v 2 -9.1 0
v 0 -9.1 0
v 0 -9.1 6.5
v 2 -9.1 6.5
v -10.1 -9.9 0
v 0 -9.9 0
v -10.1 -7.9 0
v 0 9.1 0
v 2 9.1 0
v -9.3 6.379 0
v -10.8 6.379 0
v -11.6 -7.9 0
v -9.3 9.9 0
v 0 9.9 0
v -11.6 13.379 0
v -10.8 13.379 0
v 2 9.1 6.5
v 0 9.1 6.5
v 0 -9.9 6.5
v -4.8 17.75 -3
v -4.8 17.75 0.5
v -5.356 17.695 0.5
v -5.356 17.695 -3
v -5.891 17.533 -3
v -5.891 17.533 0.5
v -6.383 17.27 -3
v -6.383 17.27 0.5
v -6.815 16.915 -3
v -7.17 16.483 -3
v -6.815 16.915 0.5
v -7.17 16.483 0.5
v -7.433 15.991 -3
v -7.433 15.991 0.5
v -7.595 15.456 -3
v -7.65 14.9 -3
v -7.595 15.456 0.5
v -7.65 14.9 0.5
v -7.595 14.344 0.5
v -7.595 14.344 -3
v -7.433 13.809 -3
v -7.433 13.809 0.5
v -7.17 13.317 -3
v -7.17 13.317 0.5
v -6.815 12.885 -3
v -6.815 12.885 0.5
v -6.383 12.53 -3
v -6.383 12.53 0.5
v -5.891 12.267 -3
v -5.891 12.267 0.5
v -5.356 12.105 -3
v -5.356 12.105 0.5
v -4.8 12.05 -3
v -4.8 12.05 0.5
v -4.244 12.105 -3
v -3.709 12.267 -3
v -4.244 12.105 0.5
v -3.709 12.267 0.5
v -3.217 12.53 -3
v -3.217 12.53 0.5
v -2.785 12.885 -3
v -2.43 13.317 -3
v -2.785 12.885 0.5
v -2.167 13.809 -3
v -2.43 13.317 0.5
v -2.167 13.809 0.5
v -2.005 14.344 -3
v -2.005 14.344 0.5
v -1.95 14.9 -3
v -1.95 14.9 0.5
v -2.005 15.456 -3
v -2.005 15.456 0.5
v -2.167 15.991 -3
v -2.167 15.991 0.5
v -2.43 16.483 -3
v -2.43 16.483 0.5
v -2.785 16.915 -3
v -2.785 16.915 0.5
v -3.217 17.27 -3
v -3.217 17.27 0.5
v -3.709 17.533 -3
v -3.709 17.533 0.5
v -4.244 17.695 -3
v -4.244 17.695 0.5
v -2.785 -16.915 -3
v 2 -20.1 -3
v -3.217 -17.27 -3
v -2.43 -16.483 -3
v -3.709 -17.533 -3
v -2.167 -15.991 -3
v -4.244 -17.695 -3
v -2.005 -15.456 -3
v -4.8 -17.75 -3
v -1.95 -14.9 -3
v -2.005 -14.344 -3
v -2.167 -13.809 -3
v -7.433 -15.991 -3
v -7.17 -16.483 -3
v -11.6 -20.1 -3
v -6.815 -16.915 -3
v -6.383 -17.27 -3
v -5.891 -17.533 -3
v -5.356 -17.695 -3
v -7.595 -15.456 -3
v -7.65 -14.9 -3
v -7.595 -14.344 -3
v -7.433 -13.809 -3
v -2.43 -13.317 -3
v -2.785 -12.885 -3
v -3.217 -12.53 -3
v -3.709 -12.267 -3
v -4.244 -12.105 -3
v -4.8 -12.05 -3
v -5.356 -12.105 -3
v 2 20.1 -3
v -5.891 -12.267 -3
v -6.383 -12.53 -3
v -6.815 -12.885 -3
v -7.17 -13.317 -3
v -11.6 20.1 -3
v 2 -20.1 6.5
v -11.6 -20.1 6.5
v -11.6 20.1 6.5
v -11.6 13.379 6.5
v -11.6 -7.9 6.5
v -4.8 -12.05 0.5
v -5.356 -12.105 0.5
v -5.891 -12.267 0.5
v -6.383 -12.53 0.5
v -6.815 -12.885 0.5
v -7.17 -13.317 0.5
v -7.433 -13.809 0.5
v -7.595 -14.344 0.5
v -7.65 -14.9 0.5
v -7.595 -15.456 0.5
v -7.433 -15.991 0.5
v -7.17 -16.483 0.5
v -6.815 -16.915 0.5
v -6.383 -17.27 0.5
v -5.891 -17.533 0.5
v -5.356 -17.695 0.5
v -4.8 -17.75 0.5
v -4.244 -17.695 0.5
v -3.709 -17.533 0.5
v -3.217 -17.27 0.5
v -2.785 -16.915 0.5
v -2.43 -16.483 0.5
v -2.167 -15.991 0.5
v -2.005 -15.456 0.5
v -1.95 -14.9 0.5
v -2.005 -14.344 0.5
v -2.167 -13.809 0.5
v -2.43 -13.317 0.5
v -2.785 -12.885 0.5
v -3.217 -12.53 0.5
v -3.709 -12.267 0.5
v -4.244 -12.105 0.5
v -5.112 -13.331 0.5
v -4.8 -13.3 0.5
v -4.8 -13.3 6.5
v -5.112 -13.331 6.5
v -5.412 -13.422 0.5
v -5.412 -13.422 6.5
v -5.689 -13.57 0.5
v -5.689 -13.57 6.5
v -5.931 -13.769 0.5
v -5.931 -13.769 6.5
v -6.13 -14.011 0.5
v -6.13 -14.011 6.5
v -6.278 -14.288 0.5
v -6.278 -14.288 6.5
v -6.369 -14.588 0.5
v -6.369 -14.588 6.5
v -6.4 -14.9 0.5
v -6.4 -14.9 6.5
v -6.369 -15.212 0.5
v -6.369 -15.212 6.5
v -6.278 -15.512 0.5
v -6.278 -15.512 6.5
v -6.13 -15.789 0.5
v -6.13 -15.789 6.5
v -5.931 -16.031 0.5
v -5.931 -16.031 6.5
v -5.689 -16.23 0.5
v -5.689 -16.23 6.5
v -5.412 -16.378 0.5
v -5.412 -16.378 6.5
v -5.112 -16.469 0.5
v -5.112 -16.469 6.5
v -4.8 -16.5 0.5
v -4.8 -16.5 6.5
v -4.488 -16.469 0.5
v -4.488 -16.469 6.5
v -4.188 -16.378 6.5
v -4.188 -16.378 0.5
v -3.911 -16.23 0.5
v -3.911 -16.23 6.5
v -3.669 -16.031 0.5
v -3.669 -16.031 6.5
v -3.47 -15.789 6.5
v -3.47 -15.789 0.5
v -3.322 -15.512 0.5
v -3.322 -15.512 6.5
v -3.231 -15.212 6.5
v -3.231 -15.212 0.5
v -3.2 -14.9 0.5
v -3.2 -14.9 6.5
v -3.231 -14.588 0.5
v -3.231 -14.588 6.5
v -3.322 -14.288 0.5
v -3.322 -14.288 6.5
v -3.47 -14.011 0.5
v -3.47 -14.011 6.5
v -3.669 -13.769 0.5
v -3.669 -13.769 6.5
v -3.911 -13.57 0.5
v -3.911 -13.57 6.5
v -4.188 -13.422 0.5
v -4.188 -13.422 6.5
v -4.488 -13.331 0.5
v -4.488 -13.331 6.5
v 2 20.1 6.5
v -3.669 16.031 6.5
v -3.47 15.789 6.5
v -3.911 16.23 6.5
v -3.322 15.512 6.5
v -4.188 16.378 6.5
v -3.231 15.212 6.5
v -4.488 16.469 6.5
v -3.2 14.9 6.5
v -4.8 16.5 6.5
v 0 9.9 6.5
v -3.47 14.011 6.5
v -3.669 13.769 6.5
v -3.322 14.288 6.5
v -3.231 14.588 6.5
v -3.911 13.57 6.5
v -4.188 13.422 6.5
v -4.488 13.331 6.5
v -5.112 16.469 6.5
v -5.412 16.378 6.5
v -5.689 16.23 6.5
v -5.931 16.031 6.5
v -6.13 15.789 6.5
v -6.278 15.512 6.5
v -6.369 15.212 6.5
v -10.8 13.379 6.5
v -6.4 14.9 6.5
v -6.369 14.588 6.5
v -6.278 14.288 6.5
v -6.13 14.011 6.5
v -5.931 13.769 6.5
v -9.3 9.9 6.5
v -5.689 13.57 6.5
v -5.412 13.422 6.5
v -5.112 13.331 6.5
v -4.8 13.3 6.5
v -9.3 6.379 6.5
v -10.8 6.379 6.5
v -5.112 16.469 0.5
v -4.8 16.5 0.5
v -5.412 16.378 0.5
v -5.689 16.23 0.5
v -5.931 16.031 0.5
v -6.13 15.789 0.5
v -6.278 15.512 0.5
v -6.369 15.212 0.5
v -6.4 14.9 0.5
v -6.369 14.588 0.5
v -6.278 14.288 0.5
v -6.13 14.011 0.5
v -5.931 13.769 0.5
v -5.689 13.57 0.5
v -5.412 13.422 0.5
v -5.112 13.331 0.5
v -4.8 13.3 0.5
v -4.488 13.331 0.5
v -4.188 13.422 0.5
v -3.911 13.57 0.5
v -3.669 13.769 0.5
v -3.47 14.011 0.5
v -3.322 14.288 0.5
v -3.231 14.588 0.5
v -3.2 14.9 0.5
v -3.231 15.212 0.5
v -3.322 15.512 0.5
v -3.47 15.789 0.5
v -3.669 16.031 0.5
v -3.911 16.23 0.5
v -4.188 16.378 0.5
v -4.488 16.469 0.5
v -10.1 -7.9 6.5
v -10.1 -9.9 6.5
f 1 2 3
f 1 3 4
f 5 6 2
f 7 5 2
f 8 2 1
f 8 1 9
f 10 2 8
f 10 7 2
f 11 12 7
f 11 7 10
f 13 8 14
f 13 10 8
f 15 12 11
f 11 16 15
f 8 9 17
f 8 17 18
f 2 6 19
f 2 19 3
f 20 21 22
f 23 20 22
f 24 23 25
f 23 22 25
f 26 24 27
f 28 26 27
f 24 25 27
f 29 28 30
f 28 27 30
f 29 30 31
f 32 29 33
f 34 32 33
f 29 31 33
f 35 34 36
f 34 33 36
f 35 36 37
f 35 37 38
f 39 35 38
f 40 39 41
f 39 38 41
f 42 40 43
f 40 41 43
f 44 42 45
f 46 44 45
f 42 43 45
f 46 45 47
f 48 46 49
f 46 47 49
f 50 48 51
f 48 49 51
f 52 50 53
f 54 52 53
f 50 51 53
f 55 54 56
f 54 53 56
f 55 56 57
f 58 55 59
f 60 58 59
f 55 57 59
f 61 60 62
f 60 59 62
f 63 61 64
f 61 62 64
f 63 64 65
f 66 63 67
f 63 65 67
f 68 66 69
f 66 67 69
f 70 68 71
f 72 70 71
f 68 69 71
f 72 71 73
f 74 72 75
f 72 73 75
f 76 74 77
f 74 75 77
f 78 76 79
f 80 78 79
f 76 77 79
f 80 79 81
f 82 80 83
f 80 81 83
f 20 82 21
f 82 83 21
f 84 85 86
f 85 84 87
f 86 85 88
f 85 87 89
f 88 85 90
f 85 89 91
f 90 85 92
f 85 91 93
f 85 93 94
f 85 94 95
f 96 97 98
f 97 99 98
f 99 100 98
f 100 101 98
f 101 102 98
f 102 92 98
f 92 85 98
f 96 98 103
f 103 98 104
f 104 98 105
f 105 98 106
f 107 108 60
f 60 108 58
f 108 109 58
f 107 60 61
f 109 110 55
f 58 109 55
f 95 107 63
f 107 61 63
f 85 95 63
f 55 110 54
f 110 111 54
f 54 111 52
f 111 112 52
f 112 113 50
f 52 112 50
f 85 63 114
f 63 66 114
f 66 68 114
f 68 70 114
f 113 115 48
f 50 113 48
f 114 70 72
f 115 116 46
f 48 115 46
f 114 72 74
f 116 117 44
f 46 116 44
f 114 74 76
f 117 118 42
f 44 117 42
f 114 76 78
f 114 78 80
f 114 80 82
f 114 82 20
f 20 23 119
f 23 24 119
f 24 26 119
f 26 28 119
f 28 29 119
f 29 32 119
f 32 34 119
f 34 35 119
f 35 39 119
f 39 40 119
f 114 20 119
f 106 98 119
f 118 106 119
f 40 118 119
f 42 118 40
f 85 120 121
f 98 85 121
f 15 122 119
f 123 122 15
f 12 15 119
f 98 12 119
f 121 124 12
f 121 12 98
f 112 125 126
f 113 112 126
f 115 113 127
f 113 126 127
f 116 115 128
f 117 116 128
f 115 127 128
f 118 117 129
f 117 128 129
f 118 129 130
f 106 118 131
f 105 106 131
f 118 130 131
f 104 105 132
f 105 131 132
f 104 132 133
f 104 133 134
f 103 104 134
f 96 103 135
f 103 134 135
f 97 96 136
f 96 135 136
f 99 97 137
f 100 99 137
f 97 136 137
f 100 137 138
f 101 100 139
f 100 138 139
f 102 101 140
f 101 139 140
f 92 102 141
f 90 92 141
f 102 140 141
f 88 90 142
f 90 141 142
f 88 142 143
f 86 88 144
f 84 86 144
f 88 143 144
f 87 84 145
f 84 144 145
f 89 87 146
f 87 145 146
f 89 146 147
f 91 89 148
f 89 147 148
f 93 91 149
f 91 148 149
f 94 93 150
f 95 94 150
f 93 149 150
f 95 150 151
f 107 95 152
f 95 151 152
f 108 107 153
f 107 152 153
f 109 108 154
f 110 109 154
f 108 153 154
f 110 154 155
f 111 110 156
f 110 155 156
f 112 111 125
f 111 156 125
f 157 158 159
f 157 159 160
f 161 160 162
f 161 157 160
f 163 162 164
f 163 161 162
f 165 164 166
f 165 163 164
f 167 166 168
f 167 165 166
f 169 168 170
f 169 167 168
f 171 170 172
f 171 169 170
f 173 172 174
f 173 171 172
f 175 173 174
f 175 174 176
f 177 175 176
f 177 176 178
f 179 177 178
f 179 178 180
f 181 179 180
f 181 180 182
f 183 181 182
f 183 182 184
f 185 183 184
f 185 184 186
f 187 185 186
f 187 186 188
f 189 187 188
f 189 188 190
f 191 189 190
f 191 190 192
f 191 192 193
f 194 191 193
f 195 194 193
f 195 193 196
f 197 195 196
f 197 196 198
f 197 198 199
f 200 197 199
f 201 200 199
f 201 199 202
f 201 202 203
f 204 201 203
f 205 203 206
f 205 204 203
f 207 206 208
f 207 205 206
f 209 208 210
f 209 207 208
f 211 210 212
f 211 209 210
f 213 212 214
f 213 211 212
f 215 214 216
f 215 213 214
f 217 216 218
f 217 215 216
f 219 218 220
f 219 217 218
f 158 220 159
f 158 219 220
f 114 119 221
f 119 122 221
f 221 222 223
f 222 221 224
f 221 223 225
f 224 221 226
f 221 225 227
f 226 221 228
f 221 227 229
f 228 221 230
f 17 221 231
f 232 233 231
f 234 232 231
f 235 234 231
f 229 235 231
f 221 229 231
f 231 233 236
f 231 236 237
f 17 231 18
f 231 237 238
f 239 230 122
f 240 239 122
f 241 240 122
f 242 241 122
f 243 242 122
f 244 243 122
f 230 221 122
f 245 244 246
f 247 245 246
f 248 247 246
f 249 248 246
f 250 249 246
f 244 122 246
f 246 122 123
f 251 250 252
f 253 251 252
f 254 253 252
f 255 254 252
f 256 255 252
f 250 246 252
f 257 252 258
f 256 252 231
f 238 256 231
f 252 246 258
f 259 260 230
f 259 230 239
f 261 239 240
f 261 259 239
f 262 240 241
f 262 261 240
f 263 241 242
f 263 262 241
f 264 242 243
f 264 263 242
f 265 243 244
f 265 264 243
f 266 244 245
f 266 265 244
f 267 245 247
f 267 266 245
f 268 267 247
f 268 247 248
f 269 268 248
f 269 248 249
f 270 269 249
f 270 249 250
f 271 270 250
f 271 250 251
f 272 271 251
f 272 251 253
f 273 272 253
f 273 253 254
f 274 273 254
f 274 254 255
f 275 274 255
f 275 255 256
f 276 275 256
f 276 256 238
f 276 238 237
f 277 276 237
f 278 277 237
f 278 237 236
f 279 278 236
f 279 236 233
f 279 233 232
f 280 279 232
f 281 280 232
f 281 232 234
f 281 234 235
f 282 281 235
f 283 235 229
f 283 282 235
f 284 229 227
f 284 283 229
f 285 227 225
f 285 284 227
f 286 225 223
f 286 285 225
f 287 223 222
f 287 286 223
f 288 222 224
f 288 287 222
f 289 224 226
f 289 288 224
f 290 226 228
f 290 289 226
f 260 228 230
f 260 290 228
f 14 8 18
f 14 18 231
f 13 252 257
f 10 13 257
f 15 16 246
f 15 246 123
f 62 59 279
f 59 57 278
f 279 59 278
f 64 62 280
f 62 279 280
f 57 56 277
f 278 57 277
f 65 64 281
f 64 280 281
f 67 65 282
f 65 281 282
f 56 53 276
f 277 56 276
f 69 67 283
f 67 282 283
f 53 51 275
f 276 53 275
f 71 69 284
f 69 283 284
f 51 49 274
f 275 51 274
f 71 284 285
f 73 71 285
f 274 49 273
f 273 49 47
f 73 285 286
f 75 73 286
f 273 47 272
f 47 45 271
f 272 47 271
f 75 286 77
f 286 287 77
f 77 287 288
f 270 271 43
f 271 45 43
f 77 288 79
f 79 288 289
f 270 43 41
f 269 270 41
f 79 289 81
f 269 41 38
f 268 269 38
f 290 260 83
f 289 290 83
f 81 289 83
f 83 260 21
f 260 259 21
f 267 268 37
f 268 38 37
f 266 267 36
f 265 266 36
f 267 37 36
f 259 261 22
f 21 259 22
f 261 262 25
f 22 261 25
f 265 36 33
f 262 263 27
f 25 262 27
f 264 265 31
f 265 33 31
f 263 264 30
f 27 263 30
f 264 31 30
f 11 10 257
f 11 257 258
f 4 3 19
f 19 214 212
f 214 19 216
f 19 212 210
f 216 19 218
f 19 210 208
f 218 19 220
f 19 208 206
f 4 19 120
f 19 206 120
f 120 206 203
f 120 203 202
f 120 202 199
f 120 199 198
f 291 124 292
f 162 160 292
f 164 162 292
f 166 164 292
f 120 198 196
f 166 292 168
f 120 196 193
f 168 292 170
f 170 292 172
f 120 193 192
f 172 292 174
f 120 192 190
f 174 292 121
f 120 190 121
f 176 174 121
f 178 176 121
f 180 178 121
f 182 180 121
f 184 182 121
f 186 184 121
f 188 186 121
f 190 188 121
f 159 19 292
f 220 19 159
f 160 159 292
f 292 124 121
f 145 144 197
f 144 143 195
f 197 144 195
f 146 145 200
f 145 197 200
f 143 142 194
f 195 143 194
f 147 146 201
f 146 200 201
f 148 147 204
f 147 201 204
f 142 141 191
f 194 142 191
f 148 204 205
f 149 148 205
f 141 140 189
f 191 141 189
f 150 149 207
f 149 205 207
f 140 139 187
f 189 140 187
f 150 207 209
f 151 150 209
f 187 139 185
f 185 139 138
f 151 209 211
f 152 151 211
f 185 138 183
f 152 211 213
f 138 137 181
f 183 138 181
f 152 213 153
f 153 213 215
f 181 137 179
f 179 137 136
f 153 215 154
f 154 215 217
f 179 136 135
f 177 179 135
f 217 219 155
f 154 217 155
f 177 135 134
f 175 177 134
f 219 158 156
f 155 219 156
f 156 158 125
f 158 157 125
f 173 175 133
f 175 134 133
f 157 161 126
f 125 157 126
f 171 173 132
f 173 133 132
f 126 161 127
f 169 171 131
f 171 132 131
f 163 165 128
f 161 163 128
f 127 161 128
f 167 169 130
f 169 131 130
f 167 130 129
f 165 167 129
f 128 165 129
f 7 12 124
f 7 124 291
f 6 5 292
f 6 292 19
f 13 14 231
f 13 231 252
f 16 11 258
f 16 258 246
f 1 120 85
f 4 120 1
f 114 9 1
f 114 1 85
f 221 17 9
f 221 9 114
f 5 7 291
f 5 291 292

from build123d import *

# Parameters (mm, degrees)
SKETCH1_R               = 2.85
SKETCH1_R_2             = 1.6
BOSS_EXTRUDE1_DEPTH     = 6.5
SKETCH1_3_R             = 2.85
SKETCH1_3_R_2           = 1.6
BOSS_EXTRUDE2_DEPTH     = 3
CUT_EXTRUDE1_START      = -3
SKETCH1_4_R             = 2.85
CUT_EXTRUDE1_DEPTH      = 3.5
CUT_EXTRUDE1_DEPTH_BACK = 4


with BuildPart() as part:
    # Sketch1 → Boss-Extrude1 (new body)
    with BuildSketch(Plane(origin=(0, 0, 0), x_dir=(0, 1, 0), z_dir=(0, 0, 1))):
        Polygon((-7.9, 10.1), (-9.9, 10.1), (-9.9, 0), (-9.1, 0), (-9.1, -2), (-20.1, -2), (-20.1, 11.6), (-7.9, 11.6), align=None)
        with Locations((-14.9, 4.8)):
            Circle(SKETCH1_R, mode=Mode.SUBTRACT)
        Polygon((13.378898747, 11.6), (20.1, 11.6), (20.1, -2), (9.1, -2), (9.1, 0), (9.9, 0), (9.9, 9.3), (6.378898747, 9.3), (6.378898747, 10.8), (13.378898747, 10.8), align=None)
        with Locations((14.9, 4.8)):
            Circle(SKETCH1_R, mode=Mode.SUBTRACT)
        with Locations((-14.9, 4.8)):
            Circle(SKETCH1_R)
        with Locations((-14.9, 4.8)):
            Circle(SKETCH1_R_2, mode=Mode.SUBTRACT)
        with Locations((14.9, 4.8)):
            Circle(SKETCH1_R)
        with Locations((14.9, 4.8)):
            Circle(SKETCH1_R_2, mode=Mode.SUBTRACT)
    extrude(amount=BOSS_EXTRUDE1_DEPTH)

    # Sketch1<3> → Boss-Extrude2 (add)
    with BuildSketch(Plane(origin=(0, 0, 0), x_dir=(0, 1, 0), z_dir=(0, 0, 1))):
        with Locations((14.9, 4.8)):
            Circle(SKETCH1_3_R)
        with Locations((14.9, 4.8)):
            Circle(SKETCH1_3_R_2, mode=Mode.SUBTRACT)
        Polygon((13.378898747, 11.6), (20.1, 11.6), (20.1, -2), (9.1, -2), (9.1, 0), (9.9, 0), (9.9, 9.3), (6.378898747, 9.3), (6.378898747, 10.8), (13.378898747, 10.8), align=None)
        with Locations((14.9, 4.8)):
            Circle(SKETCH1_3_R, mode=Mode.SUBTRACT)
        Polygon((-7.9, 11.6), (13.378898747, 11.6), (13.378898747, 10.8), (6.378898747, 10.8), (6.378898747, 9.3), (9.9, 9.3), (9.9, 0), (9.1, 0), (9.1, -2), (-9.1, -2), (-9.1, 0), (-9.9, 0), (-9.9, 10.1), (-7.9, 10.1), align=None)
        with Locations((-14.9, 4.8)):
            Circle(SKETCH1_3_R)
        with Locations((-14.9, 4.8)):
            Circle(SKETCH1_3_R_2, mode=Mode.SUBTRACT)
        Polygon((-7.9, 10.1), (-9.9, 10.1), (-9.9, 0), (-9.1, 0), (-9.1, -2), (-20.1, -2), (-20.1, 11.6), (-7.9, 11.6), align=None)
        with Locations((-14.9, 4.8)):
            Circle(SKETCH1_3_R, mode=Mode.SUBTRACT)
    extrude(amount=-BOSS_EXTRUDE2_DEPTH)

    # Sketch1<4> → Cut-Extrude1 (cut, two sides)
    with BuildSketch(Plane(origin=(0, 0, 0), x_dir=(0, 1, 0), z_dir=(0, 0, 1)).offset(CUT_EXTRUDE1_START)) as cut_extrude1_sk:
        with Locations((14.9, 4.8)):
            Circle(SKETCH1_4_R)
        with Locations((-14.9, 4.8)):
            Circle(SKETCH1_4_R)
    extrude(amount=CUT_EXTRUDE1_DEPTH, mode=Mode.SUBTRACT)
    extrude(cut_extrude1_sk.sketch, amount=-CUT_EXTRUDE1_DEPTH_BACK, mode=Mode.SUBTRACT)


solid = part.part
